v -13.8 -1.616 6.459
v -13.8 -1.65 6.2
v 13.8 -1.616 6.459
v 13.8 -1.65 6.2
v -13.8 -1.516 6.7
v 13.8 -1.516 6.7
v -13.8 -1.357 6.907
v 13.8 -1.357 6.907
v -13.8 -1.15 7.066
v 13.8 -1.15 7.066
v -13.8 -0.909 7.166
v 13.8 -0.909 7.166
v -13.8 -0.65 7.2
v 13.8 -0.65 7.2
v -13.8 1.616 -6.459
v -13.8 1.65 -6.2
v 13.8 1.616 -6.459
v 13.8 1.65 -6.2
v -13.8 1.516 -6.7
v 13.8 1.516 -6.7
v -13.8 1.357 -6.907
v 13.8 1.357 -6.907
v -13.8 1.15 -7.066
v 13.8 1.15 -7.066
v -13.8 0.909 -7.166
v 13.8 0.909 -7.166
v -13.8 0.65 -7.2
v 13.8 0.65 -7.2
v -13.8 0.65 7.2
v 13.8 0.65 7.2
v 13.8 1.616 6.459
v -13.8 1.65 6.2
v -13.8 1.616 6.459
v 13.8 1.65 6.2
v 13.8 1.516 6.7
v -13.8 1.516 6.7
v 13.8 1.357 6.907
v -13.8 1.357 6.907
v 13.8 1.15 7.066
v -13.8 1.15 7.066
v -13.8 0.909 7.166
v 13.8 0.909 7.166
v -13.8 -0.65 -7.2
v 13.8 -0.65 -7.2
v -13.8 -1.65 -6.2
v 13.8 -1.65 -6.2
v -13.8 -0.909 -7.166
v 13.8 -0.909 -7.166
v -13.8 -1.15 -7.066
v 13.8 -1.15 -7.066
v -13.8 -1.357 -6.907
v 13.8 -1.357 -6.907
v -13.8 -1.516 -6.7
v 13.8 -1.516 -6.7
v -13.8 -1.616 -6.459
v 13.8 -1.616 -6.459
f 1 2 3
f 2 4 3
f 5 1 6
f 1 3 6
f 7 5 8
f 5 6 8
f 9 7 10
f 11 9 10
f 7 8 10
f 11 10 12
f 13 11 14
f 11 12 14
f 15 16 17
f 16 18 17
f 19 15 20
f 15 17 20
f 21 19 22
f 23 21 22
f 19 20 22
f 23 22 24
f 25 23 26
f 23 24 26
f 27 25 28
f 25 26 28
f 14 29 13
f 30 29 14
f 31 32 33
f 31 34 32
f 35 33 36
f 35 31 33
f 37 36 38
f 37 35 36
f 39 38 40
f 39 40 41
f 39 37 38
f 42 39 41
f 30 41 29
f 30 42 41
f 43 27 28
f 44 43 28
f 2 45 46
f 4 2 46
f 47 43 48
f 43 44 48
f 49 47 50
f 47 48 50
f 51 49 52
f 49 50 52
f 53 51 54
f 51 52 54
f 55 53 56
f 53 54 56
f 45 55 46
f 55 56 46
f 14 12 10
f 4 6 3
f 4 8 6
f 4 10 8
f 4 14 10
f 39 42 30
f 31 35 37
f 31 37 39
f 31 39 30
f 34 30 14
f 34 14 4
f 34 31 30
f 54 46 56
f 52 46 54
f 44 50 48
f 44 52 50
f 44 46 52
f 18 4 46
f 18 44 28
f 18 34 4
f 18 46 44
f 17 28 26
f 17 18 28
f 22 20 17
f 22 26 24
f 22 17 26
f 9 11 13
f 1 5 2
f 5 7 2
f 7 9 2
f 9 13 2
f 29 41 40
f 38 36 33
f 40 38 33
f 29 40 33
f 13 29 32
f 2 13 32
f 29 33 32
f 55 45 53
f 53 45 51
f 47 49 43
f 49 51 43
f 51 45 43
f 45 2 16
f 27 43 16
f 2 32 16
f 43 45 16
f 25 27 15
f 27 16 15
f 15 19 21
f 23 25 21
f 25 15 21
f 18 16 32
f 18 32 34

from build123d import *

# Parameters (mm, degrees)
BOSS_EXTRUDE1_DEPTH      = 1.65
BOSS_EXTRUDE1_DEPTH_BACK = 1.65
SKETCH1_W                = 27.6
SKETCH1_H                = 14.4
FILLET1_R                = 1


with BuildPart() as part:
    # Sketch1 → Boss-Extrude1 (new, two sides: drawn at the far end of the back side and taken through both)
    with BuildSketch(Plane(origin=(0, 0, 0), x_dir=(1, 0, 0), z_dir=(0, 1, 0)).offset(-BOSS_EXTRUDE1_DEPTH_BACK)):
        Rectangle(SKETCH1_W, SKETCH1_H)
    extrude(amount=BOSS_EXTRUDE1_DEPTH + BOSS_EXTRUDE1_DEPTH_BACK)

    # Fillet1
    fillet1_edges = [part.edges().sort_by_distance(p)[0] for p in [
        (0, -1.65, -7.2),
        (0, 1.65, -7.2),
        (0, -1.65, 7.2),
        (0, 1.65, 7.2),
    ]]
    fillet(fillet1_edges, radius=FILLET1_R)


solid = part.part
